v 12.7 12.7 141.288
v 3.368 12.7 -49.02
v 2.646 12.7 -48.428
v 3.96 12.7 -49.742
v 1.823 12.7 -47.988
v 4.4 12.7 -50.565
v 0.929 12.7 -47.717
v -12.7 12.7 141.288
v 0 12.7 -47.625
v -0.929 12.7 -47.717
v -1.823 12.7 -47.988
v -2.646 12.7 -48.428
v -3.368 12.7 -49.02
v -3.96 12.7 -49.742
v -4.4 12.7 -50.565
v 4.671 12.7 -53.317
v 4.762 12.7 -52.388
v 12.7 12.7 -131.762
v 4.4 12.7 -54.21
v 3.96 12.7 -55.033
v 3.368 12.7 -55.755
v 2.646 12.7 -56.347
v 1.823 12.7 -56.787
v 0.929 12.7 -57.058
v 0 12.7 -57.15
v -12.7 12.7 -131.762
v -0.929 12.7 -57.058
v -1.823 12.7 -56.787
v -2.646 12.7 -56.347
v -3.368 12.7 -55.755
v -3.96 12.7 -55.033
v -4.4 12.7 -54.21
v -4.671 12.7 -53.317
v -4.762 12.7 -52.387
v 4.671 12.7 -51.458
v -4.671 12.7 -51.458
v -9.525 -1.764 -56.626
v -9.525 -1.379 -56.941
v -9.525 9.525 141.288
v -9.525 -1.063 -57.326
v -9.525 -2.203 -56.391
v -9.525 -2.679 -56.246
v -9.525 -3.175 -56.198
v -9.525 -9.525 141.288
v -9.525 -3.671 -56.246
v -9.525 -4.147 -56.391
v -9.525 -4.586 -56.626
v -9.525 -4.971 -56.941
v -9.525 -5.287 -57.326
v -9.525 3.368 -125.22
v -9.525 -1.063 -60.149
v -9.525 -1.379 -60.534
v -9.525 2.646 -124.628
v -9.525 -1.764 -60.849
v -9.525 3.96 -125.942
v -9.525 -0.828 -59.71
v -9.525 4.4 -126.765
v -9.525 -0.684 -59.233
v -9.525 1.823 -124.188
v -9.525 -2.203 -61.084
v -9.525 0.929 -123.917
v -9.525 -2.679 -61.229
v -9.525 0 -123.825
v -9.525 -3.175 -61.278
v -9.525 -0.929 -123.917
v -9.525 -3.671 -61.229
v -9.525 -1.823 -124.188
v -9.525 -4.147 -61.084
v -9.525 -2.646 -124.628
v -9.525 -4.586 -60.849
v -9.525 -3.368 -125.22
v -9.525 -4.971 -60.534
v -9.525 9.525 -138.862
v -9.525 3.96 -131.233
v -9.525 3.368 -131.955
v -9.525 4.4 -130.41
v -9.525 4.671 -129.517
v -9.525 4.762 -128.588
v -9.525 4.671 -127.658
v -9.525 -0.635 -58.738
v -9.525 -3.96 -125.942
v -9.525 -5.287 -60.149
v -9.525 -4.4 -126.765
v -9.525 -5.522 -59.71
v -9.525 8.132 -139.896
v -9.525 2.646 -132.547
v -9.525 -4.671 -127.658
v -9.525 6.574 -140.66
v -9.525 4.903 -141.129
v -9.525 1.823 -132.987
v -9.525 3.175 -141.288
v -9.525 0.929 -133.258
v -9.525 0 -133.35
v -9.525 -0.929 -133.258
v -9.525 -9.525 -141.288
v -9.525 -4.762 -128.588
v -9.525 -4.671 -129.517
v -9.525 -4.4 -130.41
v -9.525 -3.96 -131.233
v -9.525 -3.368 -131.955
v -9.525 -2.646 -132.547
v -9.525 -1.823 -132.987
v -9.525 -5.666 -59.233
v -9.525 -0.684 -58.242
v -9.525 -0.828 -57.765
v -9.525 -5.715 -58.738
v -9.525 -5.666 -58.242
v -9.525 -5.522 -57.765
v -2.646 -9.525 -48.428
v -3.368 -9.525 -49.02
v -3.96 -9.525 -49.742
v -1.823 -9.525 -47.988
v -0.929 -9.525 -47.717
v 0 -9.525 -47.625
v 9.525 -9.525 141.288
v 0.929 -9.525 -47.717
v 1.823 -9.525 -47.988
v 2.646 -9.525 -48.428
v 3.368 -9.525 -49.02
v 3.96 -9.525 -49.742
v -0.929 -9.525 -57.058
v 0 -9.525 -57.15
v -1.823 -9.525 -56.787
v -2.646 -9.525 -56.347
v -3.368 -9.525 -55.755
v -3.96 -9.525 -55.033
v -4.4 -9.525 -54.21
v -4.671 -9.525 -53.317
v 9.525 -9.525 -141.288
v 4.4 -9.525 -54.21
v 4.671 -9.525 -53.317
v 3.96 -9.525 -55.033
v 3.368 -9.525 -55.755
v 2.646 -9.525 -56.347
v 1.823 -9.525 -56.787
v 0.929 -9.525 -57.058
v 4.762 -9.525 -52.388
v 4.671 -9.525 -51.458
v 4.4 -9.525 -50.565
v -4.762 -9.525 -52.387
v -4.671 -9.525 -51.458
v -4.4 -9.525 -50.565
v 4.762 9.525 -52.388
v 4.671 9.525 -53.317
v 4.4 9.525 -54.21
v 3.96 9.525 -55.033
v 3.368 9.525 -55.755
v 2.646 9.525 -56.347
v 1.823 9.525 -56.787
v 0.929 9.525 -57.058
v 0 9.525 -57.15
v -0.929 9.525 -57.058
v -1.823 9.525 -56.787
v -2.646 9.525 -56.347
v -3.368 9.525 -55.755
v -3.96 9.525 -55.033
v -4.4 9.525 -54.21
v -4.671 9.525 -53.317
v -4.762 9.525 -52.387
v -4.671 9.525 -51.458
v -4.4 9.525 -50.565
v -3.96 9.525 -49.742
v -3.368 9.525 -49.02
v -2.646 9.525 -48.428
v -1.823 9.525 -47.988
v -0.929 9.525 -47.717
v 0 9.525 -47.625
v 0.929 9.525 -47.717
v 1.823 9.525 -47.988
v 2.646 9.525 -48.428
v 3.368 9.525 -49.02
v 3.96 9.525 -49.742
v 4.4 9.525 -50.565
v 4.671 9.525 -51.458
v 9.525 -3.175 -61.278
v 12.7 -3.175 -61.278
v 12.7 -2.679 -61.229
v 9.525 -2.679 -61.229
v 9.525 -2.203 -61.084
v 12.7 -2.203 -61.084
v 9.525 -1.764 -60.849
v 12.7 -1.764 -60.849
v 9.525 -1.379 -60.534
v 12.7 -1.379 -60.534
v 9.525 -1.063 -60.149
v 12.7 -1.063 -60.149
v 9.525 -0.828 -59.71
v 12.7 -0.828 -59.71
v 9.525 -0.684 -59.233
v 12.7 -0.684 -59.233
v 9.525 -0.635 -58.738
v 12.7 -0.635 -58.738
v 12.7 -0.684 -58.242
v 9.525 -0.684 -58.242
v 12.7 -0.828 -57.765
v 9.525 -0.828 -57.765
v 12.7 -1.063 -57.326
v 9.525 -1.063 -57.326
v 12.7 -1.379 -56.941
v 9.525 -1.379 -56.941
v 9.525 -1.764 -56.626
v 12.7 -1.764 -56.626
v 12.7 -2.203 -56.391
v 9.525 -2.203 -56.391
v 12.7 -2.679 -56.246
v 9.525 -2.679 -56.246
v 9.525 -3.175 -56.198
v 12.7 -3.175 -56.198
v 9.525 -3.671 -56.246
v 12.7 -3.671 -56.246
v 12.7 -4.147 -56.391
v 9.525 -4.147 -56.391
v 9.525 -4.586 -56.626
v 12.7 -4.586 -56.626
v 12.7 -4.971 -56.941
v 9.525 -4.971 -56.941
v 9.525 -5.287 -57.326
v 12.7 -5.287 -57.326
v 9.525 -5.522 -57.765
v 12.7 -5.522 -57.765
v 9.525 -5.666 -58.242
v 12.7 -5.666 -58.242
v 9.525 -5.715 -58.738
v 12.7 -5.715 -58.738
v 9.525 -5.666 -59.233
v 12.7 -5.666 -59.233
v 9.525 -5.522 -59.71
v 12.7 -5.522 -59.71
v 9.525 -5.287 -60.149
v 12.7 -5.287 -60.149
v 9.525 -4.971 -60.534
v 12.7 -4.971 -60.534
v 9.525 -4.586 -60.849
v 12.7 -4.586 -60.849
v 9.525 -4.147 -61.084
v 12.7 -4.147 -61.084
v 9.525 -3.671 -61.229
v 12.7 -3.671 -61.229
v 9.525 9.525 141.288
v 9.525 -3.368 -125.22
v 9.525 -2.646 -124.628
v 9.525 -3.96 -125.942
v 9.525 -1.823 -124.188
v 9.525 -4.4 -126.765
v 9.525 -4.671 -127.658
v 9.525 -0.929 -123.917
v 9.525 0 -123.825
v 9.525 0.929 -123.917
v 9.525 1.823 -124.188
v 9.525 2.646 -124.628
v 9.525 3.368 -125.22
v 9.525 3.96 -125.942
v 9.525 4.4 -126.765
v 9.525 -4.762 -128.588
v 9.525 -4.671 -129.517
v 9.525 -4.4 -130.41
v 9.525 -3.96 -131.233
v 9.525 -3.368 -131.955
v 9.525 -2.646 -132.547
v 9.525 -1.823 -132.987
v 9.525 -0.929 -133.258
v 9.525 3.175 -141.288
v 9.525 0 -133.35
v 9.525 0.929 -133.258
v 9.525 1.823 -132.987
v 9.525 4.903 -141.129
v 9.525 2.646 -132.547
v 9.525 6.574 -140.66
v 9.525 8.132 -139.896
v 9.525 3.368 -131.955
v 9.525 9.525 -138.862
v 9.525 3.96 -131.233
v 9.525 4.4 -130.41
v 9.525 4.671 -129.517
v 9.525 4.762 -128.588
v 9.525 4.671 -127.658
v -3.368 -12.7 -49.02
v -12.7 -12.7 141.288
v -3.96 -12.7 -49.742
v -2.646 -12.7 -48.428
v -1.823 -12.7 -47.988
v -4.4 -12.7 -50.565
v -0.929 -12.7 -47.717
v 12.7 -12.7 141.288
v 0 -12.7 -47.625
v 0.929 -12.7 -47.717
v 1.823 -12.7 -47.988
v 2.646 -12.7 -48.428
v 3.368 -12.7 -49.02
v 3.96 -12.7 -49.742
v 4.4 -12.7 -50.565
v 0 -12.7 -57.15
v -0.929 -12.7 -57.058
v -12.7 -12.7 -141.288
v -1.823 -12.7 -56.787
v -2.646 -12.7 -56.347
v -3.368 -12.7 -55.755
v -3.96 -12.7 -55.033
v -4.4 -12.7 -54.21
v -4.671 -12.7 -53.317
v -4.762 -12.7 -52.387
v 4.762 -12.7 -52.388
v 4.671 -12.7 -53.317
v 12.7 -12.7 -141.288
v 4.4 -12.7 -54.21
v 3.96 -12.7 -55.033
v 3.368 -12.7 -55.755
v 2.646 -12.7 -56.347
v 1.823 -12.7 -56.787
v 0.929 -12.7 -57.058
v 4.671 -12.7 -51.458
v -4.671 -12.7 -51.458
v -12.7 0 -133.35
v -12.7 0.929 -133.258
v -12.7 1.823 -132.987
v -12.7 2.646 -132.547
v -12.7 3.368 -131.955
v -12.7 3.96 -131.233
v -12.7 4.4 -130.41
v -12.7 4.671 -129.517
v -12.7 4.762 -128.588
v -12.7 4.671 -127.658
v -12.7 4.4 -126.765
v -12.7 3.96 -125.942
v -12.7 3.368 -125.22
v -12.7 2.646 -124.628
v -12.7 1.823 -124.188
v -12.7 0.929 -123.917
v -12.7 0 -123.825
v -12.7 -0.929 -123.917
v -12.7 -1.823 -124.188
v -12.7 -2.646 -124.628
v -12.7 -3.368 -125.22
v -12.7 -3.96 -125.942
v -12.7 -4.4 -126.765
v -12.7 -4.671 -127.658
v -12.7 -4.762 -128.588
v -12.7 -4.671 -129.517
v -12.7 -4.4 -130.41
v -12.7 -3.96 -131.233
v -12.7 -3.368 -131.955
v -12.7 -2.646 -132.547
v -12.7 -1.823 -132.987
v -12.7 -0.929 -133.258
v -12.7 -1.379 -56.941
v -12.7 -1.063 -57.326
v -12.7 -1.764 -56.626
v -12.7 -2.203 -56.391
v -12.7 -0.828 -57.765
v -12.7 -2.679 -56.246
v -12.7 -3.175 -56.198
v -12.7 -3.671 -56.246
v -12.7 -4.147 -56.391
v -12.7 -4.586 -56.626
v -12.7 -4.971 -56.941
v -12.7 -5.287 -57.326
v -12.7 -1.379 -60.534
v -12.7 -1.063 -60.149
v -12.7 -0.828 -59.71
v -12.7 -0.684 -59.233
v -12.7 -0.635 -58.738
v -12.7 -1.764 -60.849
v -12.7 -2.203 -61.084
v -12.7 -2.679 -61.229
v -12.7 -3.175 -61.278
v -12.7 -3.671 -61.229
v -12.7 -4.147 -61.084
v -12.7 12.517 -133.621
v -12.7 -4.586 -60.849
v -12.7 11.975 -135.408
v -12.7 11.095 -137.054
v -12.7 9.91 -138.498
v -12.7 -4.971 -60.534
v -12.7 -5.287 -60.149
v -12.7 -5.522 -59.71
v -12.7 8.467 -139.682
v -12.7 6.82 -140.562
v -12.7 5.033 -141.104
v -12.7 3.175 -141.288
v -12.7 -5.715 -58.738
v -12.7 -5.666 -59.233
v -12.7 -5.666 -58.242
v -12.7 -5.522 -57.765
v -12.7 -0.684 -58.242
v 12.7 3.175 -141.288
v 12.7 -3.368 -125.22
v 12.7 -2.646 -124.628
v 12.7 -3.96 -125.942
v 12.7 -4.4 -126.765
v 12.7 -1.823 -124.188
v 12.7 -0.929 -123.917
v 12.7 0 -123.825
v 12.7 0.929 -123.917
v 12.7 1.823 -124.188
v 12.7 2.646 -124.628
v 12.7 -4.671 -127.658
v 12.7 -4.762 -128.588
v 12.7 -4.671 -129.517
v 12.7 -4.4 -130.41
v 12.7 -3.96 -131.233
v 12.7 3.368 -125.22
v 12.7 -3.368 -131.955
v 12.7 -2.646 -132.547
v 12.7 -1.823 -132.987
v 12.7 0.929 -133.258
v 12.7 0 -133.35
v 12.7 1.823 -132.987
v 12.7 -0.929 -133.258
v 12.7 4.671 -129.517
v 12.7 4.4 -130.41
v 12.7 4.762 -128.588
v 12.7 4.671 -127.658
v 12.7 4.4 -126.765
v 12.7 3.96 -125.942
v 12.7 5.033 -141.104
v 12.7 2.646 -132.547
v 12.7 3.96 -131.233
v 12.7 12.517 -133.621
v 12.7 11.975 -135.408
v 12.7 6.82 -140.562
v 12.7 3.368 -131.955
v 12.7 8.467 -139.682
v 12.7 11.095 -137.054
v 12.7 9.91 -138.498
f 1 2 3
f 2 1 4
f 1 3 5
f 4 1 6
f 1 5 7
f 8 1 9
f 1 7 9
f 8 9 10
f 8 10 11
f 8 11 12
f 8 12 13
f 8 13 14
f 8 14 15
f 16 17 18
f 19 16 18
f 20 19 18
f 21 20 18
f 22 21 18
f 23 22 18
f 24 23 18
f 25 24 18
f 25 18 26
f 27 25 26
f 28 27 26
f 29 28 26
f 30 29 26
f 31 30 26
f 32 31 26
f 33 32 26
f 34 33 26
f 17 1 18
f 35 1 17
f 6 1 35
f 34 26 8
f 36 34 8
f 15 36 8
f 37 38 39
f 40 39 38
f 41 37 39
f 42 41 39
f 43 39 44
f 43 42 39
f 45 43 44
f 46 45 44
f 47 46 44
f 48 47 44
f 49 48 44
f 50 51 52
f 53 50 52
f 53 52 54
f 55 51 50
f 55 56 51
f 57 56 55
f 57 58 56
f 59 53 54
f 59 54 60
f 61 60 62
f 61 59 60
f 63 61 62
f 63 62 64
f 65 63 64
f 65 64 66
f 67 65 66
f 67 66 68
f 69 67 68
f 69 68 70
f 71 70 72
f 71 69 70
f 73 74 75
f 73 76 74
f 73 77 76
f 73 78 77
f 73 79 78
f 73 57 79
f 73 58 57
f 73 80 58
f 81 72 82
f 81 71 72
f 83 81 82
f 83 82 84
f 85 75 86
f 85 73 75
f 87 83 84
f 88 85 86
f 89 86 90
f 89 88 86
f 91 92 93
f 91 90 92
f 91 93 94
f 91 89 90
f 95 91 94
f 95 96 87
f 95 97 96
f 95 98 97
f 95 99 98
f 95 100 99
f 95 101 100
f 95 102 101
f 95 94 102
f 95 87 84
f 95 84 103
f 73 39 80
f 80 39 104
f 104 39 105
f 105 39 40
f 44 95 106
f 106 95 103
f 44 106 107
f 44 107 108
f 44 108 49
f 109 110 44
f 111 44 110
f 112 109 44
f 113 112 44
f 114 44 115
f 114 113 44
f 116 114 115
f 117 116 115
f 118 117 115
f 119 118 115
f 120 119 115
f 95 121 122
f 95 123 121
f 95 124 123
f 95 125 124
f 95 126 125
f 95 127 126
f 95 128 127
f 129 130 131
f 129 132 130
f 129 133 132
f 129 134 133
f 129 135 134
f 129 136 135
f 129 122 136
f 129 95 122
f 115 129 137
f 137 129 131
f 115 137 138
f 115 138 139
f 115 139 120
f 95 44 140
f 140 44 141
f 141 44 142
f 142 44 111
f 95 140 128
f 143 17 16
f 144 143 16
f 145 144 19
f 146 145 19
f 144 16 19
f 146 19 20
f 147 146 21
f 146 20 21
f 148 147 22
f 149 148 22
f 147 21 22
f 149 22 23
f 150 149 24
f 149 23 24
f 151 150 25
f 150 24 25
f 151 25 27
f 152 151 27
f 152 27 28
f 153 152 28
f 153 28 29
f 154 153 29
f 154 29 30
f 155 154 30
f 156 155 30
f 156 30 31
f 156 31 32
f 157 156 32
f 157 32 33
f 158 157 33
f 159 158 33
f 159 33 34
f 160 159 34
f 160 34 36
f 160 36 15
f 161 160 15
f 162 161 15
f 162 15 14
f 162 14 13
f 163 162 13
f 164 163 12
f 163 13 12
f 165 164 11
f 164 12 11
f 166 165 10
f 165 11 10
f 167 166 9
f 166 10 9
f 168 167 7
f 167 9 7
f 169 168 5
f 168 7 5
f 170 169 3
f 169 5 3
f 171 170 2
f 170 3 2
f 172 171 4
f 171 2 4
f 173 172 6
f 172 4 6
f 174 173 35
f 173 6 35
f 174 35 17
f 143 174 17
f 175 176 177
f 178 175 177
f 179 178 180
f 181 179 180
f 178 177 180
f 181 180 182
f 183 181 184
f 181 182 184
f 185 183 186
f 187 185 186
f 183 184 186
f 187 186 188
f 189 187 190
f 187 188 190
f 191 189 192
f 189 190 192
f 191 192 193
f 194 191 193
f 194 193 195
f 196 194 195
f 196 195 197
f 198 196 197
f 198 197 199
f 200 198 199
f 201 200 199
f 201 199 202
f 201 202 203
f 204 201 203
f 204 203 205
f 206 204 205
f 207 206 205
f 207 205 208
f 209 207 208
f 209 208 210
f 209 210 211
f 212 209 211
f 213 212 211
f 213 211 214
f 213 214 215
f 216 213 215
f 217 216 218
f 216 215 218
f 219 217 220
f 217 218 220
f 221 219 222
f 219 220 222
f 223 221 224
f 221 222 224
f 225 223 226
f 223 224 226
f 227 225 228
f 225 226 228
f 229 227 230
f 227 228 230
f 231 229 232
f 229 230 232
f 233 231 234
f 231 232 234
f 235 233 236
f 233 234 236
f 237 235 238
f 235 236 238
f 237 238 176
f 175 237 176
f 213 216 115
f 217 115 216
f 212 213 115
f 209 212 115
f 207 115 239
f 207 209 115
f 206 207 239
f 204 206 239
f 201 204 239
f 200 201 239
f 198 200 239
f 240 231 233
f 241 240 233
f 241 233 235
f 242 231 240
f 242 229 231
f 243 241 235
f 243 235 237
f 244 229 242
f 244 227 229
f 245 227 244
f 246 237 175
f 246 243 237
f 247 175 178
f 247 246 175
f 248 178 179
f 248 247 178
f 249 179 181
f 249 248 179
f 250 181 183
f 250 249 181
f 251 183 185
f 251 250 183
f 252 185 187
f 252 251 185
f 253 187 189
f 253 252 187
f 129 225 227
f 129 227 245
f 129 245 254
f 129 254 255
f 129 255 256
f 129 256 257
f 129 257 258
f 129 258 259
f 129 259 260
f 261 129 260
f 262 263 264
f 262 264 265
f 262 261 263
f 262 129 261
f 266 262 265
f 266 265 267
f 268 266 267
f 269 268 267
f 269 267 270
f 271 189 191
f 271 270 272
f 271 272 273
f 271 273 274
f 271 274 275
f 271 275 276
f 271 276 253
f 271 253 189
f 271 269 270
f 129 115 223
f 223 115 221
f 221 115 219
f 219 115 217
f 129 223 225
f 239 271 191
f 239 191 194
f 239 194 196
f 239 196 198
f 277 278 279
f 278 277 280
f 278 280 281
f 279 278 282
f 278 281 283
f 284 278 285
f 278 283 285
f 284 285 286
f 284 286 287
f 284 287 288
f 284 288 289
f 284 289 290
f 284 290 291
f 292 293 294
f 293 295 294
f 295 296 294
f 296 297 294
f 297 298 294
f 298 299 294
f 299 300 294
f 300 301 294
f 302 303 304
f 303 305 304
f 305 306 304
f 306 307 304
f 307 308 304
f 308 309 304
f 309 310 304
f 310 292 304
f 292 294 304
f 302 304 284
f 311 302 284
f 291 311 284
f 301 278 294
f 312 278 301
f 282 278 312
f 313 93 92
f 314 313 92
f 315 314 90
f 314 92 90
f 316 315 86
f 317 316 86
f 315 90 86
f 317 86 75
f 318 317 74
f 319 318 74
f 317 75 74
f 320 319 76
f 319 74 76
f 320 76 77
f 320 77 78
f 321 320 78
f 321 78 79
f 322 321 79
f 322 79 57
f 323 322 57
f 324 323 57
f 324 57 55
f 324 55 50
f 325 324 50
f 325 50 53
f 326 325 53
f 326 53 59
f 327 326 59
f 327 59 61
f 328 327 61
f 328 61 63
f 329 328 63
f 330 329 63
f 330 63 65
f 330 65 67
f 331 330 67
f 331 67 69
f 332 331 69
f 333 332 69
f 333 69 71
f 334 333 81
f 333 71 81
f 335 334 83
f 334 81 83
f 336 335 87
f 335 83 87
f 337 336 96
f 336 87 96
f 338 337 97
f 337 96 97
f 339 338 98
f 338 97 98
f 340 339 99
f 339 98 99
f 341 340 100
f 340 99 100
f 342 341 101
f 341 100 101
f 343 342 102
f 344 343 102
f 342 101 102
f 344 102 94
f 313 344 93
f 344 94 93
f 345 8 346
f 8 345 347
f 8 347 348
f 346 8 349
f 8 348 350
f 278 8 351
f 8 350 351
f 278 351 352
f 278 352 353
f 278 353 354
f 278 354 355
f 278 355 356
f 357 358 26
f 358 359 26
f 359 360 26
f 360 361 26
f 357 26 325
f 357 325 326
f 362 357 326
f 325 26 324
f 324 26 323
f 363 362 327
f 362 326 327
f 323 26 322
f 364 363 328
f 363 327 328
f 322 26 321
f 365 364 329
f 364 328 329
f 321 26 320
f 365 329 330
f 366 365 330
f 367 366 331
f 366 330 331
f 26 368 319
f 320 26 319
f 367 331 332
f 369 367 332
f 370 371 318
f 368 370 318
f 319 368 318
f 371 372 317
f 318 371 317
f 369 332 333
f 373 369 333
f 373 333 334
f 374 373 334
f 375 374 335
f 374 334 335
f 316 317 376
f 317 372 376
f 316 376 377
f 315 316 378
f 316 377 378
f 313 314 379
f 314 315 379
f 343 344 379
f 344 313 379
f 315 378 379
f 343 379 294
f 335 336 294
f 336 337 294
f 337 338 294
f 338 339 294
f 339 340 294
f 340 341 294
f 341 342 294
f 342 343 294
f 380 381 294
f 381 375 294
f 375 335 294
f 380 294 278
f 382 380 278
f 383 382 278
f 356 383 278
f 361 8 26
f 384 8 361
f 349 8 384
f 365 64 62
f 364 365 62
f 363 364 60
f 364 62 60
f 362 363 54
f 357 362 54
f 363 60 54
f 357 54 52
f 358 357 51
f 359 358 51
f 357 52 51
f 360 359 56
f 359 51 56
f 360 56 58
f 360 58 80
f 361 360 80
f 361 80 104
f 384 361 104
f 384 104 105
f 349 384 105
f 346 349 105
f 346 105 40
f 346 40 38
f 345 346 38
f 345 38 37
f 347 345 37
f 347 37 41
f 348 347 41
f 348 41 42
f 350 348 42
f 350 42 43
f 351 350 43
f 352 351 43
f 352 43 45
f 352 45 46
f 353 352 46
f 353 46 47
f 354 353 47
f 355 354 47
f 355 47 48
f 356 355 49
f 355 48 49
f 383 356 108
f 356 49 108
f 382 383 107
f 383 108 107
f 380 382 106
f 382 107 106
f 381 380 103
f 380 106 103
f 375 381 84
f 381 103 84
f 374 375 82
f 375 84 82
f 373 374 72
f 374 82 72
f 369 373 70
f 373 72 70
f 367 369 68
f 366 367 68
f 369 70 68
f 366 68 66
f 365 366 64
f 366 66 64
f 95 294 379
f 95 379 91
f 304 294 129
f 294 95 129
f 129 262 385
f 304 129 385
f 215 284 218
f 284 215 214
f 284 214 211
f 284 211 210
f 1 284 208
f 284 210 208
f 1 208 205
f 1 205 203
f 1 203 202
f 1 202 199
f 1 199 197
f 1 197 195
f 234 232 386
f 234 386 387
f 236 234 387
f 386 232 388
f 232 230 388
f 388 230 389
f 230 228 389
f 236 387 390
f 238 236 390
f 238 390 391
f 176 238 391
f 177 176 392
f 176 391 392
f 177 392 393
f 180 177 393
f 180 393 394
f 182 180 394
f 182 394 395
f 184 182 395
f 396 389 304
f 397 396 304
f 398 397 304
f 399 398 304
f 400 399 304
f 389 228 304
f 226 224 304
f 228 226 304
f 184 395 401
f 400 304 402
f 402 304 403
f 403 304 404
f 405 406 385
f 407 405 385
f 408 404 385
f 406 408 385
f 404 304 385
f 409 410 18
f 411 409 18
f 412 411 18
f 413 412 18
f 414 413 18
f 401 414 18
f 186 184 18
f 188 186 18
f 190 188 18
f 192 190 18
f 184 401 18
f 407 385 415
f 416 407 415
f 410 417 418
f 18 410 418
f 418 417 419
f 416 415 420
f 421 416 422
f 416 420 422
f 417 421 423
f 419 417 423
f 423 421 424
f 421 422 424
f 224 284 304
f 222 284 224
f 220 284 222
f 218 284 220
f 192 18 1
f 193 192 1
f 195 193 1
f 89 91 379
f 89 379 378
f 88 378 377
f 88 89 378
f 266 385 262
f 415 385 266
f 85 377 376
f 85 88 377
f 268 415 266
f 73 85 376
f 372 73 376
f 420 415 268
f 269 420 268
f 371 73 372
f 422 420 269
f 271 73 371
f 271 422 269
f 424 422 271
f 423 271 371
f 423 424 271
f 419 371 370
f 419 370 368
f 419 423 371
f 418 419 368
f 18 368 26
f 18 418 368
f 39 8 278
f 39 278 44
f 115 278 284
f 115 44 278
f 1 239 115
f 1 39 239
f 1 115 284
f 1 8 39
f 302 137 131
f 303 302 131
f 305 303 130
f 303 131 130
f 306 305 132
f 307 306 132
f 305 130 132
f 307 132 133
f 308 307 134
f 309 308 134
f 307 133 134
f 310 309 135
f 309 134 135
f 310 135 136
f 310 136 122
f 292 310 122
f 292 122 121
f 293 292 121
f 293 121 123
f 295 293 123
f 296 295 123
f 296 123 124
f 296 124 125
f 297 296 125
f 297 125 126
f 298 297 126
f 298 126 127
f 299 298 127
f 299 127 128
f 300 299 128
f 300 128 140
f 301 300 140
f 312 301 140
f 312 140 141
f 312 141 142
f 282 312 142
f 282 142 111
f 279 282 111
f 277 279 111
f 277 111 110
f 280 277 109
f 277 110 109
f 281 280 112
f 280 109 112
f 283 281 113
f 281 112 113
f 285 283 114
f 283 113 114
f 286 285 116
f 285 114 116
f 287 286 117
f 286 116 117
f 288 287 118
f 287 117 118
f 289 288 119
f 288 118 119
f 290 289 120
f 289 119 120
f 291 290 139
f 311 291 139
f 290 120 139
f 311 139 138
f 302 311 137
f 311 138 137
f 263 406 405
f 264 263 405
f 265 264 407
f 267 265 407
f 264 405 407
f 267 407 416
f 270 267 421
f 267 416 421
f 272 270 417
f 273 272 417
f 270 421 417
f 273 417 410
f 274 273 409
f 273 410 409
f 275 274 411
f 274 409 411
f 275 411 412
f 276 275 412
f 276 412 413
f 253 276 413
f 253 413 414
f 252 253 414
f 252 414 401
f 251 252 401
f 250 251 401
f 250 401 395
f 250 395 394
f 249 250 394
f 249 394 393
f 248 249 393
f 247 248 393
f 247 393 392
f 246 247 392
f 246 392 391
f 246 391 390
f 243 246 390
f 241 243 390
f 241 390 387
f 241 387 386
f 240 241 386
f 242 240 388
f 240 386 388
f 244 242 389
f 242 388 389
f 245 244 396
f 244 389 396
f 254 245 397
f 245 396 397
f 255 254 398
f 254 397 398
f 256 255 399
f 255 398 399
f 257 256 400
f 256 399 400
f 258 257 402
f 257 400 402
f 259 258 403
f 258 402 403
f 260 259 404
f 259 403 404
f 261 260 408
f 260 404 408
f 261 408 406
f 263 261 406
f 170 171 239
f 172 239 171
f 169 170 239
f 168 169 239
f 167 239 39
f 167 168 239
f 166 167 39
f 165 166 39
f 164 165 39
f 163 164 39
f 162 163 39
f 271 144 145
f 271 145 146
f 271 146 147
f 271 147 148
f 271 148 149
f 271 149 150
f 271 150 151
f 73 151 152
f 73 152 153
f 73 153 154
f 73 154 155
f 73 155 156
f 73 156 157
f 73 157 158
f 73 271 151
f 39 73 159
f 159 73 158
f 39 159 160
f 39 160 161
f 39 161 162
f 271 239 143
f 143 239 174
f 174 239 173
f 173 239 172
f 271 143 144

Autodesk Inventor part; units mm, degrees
ref_plane "YZ Plane" through (0, 0, 0) normal (1, 0, 0) x (0, 1, 0)
ref_plane "XZ Plane" through (0, 0, 0) normal (0, 1, 0) x (-1, 0, 0)
ref_plane "XY Plane" through (0, 0, 0) normal (0, 0, 1) x (1, 0, 0)
sketch "Sketch1" plane through (0, 0, 0) normal (0, 0, 1) x (1, 0, 0)
  line L0 (-12.7, -12.7) -> (12.7, -12.7)
  line L1 (12.7, -12.7) -> (12.7, 12.7)
  line L2 (12.7, 12.7) -> (-12.7, 12.7)
  line L3 (-12.7, 12.7) -> (-12.7, -12.7)
  line L4 (-12.7, -12.7) -> (12.7, 12.7) construction
  line L5 (12.7, -12.7) -> (-12.7, 12.7) construction
  line L6 (-9.525, -9.525) -> (9.525, -9.525)
  line L7 (9.525, -9.525) -> (9.525, 9.525)
  line L8 (9.525, 9.525) -> (-9.525, 9.525)
  line L9 (-9.525, 9.525) -> (-9.525, -9.525)
  line L10 (-9.525, -9.525) -> (9.525, 9.525) construction
  line L11 (9.525, -9.525) -> (-9.525, 9.525) construction
  point P0 (0, 0)
  dimension "d0" = 25.4
  dimension "d1" = 3.175
extrude "Extrusion1" add sketch "Sketch1" along normal mid plane 282.575
sketch "Sketch2" plane through (12.7, -12.7, 141.2875) normal (1, 0, 0) x (0, 0, -1)
  line L0 (0, 22.225) -> (0, 3.175) construction
  line L1 (0, 12.7) -> (282.575, 12.7) construction
  line L2 (282.575, 3.175) -> (282.575, 22.225) construction
  circle A0 centre (269.875, 12.7) radius 4.7625
  circle A1 centre (200.025, 9.525) radius 2.54
  point P0 (141.2875, 12.7)
  dimension "d4" = 9.525
  dimension "d5" = 12.7
  dimension "d19" = 5.08
  dimension "d20" = 69.85
  dimension "d21" = 3.175
extrude "Extrusion2" cut sketch "Sketch2" against normal through all
sketch "Sketch3" plane through (-12.7, 12.7, 141.2875) normal (0, 1, 0) x (1, 0, 0)
  line L0 (0, 0) -> (25.4, 0) construction
  line L1 (22.225, 282.575) -> (3.175, 282.575) construction
  line L2 (0, 282.575) -> (0, 0) projected
  line L3 (3.175, 282.575) -> (22.225, 282.575) construction
  line L4 (3.175, 282.575) -> (3.175, 0) construction
  circle A0 centre (12.7, 193.675) radius 4.7625
  line L5 (25.4, 282.575) -> (25.4, 0) projected
  point P0 (12.7, 141.2875)
  dimension "d15" = 3.175
  dimension "d22" = 88.9
  dimension "d23" = 12.7
  dimension "d24" = 9.525
extrude "Extrusion3" cut sketch "Sketch3" against normal through all
fillet "Fillet1" radius 9.525 1 edges at (0, 12.7, -141.2875)
properties part number "pivot arm" material "Aluminum 6061"
